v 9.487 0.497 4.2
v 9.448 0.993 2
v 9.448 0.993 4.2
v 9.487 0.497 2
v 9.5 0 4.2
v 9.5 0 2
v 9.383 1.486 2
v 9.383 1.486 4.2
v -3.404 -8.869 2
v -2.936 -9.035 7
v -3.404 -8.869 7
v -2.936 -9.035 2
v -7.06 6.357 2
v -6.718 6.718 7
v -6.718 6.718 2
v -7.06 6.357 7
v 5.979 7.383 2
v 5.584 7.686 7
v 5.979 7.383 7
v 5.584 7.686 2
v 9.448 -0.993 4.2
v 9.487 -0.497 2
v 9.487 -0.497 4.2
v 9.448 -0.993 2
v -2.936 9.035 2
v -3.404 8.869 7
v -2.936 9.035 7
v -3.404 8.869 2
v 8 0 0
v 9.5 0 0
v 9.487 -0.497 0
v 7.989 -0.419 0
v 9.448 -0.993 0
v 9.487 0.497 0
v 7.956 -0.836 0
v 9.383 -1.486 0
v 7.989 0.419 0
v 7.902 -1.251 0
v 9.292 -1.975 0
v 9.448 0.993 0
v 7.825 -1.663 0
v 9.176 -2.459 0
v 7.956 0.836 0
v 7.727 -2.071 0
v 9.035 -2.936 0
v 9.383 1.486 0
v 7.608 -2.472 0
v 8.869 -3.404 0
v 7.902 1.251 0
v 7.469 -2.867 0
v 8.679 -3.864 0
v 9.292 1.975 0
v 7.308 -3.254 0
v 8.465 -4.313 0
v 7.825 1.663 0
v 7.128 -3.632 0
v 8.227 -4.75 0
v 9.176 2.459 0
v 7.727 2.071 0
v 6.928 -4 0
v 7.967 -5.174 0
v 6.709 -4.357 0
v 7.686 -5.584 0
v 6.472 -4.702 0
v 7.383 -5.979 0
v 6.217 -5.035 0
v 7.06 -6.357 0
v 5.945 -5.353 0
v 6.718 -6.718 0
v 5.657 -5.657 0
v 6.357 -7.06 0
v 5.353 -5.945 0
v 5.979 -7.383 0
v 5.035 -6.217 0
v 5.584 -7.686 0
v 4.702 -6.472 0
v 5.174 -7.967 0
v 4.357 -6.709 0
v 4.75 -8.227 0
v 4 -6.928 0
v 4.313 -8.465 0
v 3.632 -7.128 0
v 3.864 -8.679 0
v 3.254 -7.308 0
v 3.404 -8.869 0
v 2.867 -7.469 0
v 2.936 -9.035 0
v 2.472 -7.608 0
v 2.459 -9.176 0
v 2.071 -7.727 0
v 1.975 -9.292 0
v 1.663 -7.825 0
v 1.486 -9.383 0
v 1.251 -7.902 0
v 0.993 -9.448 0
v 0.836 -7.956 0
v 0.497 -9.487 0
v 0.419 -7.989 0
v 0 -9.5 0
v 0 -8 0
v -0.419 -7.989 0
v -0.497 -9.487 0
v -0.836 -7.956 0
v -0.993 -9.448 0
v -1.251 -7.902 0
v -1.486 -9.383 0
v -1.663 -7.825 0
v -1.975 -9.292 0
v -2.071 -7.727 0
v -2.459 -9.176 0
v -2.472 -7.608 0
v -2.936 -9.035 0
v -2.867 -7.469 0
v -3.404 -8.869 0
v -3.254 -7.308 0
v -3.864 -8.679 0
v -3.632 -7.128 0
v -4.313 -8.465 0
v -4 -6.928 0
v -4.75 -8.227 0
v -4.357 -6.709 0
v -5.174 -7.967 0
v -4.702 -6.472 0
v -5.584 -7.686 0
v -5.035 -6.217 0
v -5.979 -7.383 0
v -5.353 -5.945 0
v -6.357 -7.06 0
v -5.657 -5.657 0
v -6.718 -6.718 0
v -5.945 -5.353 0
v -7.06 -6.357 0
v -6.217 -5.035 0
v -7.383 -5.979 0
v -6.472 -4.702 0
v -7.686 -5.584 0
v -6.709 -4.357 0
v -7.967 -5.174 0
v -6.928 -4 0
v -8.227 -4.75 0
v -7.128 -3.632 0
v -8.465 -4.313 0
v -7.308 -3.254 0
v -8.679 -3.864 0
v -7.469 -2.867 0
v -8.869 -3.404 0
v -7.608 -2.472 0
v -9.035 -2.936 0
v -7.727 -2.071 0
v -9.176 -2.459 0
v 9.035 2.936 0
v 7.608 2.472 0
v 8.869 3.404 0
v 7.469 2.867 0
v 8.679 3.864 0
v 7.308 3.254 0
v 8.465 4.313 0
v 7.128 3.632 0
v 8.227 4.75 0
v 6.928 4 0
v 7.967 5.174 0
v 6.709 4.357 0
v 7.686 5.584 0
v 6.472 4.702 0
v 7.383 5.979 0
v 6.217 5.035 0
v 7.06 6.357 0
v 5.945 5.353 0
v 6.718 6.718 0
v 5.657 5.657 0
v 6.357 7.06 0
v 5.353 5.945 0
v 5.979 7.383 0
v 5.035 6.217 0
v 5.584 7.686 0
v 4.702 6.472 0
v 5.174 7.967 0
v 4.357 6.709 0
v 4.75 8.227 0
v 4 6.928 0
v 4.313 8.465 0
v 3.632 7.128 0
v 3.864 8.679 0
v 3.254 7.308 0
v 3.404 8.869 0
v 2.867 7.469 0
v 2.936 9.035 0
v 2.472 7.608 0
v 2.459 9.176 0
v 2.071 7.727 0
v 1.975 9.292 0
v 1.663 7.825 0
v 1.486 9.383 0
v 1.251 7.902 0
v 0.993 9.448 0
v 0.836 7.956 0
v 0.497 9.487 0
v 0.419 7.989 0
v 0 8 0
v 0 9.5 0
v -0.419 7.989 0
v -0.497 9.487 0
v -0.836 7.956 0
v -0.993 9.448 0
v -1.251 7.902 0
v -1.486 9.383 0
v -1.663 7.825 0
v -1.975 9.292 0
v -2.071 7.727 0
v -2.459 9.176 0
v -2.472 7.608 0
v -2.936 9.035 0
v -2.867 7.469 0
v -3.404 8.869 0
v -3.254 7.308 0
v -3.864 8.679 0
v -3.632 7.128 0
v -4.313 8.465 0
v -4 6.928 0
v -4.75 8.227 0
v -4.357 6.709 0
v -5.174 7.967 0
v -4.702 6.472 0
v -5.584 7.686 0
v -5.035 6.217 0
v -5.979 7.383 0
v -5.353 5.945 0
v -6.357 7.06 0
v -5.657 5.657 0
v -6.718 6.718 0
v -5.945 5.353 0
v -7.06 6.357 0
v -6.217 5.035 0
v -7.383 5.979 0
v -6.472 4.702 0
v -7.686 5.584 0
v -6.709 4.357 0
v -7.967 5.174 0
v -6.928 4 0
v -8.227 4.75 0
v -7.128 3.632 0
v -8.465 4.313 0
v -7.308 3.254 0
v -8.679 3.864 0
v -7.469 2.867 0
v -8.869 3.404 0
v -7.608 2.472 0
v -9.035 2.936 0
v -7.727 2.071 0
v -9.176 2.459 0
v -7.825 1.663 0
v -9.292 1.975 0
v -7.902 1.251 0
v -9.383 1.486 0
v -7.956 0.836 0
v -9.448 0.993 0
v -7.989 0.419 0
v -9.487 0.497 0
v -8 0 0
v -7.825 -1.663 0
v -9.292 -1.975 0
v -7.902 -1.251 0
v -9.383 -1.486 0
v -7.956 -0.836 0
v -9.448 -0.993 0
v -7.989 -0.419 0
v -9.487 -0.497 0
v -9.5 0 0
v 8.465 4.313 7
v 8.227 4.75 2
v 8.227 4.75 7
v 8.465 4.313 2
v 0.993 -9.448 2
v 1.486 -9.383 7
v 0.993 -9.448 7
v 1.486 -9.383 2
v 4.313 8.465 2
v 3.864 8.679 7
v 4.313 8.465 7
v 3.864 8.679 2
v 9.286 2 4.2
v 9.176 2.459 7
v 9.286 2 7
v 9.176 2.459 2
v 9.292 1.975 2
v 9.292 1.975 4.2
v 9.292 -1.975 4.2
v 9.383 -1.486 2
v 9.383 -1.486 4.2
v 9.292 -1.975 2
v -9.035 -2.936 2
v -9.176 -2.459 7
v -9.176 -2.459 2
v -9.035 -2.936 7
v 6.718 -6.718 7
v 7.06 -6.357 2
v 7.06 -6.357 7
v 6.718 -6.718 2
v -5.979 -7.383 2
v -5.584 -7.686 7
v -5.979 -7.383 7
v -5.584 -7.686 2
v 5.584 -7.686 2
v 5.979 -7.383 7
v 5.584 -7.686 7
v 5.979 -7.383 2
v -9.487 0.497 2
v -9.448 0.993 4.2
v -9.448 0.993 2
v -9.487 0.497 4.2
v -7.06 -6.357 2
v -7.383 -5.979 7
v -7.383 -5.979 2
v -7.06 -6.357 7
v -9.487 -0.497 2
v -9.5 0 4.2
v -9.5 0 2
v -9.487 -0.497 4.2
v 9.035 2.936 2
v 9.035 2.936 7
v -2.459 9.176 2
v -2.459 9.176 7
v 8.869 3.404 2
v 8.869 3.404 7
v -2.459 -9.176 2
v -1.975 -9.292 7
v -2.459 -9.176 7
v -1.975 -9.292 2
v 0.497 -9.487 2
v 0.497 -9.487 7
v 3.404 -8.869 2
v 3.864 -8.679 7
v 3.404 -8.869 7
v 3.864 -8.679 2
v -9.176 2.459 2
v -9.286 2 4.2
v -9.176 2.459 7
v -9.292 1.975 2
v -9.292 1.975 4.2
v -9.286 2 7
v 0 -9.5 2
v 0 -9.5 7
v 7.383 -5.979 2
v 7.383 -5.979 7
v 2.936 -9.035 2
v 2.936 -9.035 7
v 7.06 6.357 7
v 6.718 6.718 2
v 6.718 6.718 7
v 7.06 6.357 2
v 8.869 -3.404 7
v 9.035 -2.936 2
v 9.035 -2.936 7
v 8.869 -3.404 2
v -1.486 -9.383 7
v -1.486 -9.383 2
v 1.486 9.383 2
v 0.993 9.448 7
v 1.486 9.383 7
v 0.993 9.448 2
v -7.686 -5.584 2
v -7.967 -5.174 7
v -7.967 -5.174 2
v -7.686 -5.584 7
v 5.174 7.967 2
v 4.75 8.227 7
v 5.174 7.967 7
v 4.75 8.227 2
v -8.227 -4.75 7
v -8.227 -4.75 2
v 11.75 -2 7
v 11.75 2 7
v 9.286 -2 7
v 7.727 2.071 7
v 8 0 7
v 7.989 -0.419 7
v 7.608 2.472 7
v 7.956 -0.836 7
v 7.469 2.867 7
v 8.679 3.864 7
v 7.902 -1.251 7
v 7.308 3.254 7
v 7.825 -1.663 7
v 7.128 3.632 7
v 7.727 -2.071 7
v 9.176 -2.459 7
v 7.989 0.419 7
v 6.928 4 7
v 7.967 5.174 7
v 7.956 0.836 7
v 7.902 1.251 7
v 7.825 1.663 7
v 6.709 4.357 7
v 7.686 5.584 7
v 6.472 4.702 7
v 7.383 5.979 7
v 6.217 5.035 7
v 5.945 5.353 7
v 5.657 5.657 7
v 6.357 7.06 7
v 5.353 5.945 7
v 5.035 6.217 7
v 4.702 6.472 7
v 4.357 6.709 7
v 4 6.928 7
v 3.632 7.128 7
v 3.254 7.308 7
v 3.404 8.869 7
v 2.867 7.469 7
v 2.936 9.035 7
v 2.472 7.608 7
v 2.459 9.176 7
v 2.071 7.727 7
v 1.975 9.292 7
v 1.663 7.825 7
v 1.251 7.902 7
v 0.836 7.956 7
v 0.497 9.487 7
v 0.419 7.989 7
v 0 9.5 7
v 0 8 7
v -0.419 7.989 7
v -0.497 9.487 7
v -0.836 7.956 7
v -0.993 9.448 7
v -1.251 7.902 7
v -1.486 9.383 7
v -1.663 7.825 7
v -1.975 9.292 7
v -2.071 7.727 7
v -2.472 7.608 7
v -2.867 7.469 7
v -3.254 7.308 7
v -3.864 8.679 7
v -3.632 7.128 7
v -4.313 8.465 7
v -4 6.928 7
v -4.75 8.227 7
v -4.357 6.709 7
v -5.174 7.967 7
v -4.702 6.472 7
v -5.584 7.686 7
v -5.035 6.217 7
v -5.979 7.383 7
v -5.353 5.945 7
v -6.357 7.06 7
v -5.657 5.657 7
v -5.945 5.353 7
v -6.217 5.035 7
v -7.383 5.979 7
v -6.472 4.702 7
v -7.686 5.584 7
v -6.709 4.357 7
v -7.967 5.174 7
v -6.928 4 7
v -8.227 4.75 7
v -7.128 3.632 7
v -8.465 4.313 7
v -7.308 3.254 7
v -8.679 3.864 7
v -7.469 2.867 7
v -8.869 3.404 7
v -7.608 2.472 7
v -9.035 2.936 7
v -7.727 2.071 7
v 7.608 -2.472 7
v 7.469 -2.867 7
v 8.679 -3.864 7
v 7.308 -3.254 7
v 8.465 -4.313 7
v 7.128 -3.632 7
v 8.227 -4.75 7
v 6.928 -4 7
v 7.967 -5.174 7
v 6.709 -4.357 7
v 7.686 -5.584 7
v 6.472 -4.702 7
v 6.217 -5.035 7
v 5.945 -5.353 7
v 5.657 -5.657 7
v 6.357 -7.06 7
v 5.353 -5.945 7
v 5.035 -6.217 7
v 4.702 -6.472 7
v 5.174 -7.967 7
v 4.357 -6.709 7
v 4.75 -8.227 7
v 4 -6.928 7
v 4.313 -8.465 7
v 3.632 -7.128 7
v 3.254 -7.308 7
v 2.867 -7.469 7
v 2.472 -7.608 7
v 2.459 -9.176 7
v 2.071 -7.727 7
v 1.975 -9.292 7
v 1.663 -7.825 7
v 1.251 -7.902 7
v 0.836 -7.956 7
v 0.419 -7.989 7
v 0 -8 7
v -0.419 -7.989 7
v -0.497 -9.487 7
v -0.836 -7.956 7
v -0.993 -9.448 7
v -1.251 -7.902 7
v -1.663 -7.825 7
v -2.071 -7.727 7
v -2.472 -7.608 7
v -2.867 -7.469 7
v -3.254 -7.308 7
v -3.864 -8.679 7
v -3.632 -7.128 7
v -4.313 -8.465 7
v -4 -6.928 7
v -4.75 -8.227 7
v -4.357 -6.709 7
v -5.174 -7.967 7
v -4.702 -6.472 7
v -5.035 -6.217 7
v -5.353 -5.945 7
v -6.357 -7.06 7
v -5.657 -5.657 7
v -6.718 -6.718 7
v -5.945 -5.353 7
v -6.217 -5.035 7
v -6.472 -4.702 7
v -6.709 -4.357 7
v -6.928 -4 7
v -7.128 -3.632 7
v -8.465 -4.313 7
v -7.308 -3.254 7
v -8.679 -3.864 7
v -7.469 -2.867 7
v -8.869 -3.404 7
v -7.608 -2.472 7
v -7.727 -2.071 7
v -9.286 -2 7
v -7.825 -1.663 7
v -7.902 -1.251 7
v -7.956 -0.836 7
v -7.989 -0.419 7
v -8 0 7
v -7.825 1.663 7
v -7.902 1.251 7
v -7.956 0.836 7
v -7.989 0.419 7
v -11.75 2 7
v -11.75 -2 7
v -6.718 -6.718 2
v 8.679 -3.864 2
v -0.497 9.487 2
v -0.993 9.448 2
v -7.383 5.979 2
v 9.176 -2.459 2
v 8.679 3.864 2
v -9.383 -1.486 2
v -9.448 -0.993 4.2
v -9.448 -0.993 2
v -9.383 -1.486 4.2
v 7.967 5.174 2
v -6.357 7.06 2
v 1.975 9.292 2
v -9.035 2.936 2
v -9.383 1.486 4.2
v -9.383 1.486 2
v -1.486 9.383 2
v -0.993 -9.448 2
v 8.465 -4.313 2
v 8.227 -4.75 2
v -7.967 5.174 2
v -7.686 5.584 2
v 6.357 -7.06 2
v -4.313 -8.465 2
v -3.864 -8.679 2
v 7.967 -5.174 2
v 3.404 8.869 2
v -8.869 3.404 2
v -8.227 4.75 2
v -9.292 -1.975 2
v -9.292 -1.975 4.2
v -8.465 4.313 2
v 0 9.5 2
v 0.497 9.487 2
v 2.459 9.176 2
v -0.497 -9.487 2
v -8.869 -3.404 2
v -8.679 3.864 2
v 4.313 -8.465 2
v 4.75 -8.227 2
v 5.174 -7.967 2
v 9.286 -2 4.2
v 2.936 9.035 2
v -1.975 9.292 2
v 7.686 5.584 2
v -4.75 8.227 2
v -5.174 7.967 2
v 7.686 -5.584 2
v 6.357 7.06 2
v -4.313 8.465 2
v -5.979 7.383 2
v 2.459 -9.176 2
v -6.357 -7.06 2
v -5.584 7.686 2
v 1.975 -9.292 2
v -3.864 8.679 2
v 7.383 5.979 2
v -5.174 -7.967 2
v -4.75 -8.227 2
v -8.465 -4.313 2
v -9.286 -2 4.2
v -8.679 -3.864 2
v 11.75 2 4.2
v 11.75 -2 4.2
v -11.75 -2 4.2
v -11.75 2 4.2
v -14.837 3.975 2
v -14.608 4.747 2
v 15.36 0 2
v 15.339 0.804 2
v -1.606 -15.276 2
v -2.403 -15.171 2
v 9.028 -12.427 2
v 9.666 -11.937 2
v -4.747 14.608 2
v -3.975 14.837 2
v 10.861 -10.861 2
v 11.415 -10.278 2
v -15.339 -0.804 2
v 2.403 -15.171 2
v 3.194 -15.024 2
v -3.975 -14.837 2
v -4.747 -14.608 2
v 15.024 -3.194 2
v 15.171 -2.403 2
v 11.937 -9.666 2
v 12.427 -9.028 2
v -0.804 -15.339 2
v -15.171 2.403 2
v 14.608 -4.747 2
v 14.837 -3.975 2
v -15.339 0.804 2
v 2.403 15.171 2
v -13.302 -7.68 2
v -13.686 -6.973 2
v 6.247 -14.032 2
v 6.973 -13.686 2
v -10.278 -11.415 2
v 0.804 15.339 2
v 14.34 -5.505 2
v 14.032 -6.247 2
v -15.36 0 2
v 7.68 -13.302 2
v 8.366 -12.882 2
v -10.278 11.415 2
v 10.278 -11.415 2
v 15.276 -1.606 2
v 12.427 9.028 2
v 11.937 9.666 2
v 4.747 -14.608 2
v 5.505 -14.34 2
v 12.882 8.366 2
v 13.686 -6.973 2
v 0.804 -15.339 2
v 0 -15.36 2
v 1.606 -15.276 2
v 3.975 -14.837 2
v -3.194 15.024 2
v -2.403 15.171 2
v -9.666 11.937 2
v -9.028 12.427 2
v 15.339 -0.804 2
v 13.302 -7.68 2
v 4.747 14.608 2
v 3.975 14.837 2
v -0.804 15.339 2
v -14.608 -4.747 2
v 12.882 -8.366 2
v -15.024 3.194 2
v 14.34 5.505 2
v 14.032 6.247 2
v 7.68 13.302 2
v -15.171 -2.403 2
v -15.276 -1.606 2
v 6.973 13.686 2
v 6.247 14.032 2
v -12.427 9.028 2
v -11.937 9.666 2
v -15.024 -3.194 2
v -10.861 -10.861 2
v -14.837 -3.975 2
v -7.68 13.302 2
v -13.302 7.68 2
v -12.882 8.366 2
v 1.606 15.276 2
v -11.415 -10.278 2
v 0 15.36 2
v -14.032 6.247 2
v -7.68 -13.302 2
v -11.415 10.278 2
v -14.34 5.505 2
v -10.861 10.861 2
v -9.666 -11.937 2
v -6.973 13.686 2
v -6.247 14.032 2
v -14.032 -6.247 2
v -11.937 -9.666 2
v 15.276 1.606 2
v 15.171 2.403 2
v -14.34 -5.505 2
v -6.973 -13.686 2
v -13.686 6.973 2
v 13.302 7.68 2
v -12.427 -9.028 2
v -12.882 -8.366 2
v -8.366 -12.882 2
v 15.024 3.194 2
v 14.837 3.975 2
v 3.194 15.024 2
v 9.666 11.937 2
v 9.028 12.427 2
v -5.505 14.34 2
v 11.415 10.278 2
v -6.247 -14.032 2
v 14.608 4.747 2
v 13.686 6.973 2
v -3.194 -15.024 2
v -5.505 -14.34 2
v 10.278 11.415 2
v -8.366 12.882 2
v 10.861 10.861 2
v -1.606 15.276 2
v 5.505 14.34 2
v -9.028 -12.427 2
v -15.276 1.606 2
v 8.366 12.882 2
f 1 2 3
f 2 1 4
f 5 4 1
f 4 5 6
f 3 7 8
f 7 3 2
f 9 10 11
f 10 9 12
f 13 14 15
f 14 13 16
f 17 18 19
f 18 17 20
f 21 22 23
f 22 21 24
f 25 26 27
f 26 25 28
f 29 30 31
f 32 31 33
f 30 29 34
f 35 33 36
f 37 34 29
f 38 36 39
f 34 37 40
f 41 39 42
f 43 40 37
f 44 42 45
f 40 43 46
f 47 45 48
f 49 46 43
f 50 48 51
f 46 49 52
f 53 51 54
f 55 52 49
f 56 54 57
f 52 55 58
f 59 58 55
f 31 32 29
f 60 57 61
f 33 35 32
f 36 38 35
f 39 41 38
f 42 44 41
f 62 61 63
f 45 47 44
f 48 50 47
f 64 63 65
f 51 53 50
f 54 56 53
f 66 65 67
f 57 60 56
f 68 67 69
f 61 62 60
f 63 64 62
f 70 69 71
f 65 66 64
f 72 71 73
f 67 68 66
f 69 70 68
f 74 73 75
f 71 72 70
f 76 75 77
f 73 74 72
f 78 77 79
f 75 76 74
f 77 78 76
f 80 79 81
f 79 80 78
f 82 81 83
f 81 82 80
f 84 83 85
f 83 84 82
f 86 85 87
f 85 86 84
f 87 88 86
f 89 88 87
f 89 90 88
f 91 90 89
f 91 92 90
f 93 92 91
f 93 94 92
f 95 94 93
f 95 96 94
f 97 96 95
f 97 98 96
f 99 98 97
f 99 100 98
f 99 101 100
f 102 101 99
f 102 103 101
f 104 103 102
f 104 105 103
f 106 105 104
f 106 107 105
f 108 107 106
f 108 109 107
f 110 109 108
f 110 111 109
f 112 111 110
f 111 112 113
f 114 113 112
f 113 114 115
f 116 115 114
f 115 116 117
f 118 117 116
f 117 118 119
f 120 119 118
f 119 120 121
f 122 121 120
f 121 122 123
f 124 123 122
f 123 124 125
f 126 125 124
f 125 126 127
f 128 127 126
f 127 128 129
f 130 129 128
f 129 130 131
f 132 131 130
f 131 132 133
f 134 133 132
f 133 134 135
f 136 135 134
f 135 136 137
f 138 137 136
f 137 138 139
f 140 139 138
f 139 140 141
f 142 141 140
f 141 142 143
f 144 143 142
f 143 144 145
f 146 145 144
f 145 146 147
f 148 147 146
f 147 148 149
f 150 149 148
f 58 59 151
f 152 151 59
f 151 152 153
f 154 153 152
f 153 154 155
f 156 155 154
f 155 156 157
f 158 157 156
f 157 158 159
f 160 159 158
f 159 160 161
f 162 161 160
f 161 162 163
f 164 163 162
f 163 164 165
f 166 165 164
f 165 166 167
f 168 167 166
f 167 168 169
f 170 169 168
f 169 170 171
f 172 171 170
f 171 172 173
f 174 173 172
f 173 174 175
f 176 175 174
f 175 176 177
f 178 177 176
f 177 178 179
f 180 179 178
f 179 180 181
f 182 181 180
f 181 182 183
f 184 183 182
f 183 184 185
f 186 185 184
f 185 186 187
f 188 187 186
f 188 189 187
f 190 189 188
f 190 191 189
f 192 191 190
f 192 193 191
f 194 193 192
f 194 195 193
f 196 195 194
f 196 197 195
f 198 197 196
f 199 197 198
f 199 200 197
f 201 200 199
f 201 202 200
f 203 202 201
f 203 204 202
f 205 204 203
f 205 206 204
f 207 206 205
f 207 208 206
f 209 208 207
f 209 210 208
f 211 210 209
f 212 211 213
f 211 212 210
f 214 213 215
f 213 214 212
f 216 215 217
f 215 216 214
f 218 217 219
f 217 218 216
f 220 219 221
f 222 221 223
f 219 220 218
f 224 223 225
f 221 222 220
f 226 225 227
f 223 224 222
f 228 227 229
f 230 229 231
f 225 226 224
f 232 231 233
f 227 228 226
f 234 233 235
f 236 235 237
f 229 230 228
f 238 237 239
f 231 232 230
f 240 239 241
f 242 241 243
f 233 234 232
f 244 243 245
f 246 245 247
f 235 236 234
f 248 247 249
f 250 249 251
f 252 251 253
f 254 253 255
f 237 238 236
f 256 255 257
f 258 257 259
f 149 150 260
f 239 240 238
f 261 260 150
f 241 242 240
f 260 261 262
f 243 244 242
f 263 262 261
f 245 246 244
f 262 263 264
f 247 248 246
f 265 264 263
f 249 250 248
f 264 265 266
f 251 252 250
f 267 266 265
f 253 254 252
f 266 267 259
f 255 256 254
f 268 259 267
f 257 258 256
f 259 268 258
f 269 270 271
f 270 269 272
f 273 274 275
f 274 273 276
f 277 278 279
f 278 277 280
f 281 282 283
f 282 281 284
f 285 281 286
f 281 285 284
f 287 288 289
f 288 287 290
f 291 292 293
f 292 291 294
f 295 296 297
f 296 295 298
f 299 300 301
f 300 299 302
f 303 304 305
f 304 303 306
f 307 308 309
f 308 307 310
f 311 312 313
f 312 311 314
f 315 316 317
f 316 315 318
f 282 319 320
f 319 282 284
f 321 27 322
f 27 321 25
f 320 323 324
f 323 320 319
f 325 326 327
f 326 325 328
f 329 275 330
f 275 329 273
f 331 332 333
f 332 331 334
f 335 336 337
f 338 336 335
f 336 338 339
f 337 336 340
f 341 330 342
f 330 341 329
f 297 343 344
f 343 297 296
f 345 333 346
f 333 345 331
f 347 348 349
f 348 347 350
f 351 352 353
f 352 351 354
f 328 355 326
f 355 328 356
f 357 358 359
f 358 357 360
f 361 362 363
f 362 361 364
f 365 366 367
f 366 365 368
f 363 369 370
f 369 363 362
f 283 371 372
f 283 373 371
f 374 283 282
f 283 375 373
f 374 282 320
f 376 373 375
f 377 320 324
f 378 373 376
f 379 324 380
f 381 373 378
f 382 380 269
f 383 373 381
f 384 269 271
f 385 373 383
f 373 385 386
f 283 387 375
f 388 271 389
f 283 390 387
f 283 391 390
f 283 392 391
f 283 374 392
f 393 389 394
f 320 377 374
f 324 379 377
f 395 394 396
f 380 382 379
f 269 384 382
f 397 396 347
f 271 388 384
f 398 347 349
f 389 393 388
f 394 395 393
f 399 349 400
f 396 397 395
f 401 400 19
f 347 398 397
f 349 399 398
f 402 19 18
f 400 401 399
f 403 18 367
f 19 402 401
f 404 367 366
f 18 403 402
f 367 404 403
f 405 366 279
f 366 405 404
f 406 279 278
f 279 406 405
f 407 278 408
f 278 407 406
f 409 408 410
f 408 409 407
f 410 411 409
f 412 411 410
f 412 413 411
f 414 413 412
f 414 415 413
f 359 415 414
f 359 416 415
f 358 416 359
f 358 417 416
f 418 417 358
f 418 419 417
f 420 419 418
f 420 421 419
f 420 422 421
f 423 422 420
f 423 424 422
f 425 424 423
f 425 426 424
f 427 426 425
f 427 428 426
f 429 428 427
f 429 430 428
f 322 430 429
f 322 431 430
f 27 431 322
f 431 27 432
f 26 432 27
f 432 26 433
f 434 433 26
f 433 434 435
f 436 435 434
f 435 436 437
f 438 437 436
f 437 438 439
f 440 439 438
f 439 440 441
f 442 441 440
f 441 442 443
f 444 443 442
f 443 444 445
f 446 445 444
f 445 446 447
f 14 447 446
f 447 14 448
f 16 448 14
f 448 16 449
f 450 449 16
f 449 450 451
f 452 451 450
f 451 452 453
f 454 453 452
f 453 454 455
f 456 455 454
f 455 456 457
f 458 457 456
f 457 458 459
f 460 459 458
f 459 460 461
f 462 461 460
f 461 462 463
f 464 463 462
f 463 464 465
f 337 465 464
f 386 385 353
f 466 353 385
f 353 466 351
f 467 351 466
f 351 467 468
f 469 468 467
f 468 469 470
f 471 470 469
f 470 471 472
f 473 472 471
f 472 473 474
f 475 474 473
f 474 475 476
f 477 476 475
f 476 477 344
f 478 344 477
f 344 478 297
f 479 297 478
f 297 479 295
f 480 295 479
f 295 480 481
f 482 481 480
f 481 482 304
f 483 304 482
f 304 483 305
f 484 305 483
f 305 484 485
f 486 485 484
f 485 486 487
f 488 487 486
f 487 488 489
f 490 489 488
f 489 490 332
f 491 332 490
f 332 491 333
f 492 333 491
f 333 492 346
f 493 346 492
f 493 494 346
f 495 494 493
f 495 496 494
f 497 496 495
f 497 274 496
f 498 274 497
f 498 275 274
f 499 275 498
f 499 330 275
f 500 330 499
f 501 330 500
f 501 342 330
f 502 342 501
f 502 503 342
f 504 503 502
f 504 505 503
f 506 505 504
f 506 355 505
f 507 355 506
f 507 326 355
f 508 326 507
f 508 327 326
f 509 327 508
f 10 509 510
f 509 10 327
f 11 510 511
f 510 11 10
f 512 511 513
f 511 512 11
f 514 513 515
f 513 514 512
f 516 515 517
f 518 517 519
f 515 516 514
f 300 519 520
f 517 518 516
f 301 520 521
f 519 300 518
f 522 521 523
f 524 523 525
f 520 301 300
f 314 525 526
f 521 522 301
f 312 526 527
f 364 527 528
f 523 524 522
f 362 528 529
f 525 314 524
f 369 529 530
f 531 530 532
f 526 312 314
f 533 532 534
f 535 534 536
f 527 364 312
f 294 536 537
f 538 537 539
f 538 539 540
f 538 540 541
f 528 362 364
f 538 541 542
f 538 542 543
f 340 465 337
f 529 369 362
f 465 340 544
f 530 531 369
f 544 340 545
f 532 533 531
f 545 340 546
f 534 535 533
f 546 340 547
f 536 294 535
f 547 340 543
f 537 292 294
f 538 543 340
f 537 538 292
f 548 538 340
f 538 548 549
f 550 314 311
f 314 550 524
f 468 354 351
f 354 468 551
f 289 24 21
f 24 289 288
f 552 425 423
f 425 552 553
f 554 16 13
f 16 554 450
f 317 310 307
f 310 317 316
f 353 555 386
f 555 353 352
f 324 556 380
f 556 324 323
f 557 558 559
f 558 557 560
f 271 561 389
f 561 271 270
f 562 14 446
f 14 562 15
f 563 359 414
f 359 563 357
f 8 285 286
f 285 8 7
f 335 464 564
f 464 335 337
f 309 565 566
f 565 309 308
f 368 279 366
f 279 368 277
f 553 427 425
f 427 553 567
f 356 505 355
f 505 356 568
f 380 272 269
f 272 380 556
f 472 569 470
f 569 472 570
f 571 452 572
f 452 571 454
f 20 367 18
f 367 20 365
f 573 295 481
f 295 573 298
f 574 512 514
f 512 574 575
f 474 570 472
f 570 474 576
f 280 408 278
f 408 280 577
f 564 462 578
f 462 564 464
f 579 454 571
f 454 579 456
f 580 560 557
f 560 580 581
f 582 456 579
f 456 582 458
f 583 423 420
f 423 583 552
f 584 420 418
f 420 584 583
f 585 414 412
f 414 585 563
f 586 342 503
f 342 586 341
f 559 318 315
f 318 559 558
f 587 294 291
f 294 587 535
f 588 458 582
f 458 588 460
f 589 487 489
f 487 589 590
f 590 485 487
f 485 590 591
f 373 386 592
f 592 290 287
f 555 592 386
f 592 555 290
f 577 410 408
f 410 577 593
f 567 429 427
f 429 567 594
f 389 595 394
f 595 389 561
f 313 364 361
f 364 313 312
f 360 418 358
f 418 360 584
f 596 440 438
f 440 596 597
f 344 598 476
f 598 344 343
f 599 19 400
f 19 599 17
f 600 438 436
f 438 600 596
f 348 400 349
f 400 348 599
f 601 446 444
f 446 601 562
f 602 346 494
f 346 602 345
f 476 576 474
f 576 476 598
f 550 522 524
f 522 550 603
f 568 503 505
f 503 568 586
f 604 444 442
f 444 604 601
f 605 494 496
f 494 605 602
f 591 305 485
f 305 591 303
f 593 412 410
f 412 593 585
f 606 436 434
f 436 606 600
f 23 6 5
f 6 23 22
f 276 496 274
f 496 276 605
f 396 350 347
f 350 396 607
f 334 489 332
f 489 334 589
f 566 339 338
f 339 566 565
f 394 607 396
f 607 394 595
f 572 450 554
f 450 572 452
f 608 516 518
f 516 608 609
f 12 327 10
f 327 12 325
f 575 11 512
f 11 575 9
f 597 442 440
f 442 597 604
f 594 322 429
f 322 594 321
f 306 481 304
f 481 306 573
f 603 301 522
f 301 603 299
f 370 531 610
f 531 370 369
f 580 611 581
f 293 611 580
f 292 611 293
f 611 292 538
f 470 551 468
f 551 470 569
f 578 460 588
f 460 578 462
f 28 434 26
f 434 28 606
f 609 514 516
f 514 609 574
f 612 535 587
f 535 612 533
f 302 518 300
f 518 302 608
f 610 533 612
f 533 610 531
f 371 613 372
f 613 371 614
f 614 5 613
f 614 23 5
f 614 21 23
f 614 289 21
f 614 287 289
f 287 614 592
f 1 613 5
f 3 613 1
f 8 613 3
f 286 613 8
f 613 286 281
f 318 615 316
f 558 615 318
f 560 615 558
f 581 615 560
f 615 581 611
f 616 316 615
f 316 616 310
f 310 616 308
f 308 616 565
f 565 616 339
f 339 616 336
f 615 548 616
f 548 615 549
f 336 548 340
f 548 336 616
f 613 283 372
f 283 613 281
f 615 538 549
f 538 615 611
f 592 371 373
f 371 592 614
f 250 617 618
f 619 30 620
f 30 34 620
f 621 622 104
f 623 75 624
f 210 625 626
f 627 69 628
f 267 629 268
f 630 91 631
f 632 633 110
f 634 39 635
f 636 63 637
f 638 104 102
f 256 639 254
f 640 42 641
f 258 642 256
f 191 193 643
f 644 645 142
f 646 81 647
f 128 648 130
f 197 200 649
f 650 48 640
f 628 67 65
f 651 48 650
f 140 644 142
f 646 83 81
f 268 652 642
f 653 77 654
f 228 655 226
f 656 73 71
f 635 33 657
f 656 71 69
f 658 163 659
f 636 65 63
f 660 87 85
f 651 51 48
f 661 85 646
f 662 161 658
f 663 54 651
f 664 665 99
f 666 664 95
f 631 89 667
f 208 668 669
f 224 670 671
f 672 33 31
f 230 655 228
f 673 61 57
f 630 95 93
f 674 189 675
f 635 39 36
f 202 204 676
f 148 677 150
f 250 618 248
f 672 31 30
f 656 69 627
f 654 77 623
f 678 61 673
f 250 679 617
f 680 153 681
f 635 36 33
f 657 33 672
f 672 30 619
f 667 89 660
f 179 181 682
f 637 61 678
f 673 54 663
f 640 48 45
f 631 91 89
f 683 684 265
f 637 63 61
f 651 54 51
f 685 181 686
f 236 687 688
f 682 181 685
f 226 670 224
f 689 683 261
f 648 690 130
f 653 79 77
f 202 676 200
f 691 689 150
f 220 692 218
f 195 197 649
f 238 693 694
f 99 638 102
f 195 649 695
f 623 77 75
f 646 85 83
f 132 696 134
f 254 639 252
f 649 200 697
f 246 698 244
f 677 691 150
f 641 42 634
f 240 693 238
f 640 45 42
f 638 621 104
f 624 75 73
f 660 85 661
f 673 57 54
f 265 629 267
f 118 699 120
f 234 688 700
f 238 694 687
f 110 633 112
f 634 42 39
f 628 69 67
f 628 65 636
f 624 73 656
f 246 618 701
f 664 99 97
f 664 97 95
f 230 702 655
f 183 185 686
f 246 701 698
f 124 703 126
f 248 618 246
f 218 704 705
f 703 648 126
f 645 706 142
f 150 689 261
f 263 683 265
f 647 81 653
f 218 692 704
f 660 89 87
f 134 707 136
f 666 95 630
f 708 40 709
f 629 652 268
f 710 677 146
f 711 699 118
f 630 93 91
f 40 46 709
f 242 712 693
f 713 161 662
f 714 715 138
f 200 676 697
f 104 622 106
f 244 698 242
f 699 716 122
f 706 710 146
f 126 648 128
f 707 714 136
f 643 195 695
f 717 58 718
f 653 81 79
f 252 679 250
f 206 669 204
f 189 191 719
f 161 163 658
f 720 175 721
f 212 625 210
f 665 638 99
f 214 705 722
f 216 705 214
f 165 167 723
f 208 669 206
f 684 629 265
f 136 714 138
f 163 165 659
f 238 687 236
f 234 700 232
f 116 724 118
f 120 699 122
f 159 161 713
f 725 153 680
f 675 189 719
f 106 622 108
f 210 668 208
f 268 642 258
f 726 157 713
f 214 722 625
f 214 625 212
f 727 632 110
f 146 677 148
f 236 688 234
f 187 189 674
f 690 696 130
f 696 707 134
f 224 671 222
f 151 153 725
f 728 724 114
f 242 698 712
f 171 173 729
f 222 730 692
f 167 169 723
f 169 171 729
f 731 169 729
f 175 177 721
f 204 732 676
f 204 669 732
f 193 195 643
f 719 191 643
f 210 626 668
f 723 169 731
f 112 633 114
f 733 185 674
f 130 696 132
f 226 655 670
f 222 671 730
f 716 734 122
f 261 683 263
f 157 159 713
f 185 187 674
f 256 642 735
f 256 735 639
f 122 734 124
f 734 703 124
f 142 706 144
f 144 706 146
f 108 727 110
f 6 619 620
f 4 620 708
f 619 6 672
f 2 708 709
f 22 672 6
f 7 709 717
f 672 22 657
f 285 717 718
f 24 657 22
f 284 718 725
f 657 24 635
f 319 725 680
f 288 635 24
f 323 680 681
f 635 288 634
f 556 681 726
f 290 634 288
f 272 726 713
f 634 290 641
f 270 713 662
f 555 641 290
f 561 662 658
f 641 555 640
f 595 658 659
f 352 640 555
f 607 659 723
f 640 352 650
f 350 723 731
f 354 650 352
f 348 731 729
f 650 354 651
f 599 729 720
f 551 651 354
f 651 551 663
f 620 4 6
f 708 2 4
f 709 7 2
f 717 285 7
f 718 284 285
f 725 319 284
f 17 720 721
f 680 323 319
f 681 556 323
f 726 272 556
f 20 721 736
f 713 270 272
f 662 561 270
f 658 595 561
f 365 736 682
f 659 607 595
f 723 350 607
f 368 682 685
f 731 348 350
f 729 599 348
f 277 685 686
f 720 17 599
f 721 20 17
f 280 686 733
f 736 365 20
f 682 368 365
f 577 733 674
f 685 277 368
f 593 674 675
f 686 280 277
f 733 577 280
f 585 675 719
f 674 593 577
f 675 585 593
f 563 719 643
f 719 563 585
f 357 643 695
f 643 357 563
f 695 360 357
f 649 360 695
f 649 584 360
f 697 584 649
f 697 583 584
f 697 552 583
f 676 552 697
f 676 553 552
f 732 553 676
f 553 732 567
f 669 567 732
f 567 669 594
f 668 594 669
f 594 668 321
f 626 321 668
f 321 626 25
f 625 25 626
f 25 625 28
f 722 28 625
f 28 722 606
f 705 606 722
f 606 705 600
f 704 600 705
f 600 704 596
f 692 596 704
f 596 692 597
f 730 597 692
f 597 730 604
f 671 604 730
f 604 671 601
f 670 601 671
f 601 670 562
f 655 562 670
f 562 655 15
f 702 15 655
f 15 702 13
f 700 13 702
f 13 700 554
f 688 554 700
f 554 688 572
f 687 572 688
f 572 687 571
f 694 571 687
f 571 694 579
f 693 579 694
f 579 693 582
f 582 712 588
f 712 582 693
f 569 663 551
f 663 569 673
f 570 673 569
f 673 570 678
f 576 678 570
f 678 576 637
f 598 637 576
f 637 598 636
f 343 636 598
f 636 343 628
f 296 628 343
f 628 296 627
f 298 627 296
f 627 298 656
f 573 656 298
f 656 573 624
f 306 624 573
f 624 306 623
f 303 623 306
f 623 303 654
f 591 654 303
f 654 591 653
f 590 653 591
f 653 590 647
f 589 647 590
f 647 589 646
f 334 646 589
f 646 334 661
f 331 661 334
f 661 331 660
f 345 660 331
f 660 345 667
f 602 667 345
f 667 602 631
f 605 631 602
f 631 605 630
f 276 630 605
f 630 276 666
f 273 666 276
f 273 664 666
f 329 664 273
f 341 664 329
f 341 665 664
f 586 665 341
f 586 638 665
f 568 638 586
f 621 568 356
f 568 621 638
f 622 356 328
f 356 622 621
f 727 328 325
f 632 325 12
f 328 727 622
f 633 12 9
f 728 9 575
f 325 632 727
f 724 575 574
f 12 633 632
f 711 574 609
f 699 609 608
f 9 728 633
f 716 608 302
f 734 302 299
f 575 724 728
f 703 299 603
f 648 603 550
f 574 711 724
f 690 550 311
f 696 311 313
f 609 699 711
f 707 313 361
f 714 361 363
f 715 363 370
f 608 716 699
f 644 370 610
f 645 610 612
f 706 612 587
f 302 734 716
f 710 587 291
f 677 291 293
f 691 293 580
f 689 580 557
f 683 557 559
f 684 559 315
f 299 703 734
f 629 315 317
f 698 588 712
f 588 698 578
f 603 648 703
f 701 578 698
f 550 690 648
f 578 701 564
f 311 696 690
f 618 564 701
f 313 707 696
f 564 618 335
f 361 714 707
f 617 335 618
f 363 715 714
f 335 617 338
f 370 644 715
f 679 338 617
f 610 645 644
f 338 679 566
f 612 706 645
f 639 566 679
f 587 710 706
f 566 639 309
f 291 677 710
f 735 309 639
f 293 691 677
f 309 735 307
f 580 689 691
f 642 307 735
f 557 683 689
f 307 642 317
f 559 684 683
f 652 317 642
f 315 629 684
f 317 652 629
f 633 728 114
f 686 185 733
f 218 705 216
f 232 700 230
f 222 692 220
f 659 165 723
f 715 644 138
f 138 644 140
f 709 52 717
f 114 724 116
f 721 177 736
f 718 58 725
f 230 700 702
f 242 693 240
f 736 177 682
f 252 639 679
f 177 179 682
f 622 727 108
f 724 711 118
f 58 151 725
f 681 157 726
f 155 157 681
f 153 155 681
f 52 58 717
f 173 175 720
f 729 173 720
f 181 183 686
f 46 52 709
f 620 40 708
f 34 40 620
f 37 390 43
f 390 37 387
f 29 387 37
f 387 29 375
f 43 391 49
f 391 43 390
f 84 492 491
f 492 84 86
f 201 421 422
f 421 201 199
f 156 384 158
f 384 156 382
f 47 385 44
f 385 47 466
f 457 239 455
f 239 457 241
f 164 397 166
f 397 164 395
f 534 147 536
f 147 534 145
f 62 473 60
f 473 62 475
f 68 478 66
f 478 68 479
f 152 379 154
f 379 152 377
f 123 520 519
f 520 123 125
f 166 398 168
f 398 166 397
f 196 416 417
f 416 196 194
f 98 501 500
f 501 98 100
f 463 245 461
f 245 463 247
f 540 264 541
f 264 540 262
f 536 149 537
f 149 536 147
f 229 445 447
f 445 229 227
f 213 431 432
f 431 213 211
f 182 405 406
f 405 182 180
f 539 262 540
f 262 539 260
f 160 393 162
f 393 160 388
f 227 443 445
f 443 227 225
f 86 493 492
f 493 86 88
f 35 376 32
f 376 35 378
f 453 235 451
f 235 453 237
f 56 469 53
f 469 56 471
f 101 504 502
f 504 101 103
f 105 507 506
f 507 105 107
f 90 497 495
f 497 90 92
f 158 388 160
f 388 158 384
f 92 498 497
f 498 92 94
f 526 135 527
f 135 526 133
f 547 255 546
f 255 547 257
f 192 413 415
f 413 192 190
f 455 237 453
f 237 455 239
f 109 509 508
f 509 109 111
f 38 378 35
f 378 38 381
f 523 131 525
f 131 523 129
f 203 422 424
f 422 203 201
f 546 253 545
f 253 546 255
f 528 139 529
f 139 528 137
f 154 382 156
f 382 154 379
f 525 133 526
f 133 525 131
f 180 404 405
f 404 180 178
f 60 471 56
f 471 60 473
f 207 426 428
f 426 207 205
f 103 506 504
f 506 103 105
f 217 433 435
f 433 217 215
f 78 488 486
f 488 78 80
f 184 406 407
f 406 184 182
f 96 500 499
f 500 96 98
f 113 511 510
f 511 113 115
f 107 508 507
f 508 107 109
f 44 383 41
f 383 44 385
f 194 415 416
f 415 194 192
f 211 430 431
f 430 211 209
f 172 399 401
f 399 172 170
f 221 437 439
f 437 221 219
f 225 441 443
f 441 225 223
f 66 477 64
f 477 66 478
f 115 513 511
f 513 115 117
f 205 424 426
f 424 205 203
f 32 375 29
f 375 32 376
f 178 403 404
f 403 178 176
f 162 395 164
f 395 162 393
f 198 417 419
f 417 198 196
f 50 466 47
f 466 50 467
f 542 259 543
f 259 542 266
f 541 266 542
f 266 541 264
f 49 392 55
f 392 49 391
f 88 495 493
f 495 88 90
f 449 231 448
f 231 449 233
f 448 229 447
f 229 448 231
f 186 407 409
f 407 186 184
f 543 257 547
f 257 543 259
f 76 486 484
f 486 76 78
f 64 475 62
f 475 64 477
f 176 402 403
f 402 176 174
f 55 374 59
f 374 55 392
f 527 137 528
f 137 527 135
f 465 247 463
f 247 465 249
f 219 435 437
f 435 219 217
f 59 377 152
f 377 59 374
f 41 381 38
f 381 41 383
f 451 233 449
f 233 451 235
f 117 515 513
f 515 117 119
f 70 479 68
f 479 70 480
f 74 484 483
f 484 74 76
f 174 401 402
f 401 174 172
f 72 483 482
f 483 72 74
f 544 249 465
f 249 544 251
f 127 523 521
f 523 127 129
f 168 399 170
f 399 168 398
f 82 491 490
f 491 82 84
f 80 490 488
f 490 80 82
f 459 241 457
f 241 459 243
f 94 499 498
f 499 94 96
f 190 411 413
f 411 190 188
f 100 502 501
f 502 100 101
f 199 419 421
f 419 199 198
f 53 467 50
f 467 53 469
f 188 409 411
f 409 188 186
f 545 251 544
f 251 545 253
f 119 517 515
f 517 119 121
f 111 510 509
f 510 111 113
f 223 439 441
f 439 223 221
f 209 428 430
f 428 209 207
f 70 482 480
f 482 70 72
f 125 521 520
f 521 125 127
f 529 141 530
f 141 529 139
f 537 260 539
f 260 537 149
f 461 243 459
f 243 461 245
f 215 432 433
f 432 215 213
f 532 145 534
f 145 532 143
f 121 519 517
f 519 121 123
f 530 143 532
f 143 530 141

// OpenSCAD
anchorDiam = 19;
anchorInnerDiam = 16;
height = 7;
innerCylHeight = 5;
anchorX = 2.25;
anchorY = 4;
anchorZ = 2.8;
outDiam = 30.72;
$fn= 120;

difference(){

//generates the main body
union(){
    
//Inner cylinder
cylinder(r = anchorDiam / 2, h = height);
    
//anchors
    translate([-anchorDiam/2-+2*anchorX/2,-anchorY/2,height-anchorZ])cube([anchorDiam+2*anchorX,anchorY,anchorZ]);

//Base (cone)
cylinder(h=(height - innerCylHeight), r1=anchorDiam/2, r2=outDiam/2, center=false);
}

//Hole
cylinder(r = anchorInnerDiam / 2, h = 5*height, center=true);
}
